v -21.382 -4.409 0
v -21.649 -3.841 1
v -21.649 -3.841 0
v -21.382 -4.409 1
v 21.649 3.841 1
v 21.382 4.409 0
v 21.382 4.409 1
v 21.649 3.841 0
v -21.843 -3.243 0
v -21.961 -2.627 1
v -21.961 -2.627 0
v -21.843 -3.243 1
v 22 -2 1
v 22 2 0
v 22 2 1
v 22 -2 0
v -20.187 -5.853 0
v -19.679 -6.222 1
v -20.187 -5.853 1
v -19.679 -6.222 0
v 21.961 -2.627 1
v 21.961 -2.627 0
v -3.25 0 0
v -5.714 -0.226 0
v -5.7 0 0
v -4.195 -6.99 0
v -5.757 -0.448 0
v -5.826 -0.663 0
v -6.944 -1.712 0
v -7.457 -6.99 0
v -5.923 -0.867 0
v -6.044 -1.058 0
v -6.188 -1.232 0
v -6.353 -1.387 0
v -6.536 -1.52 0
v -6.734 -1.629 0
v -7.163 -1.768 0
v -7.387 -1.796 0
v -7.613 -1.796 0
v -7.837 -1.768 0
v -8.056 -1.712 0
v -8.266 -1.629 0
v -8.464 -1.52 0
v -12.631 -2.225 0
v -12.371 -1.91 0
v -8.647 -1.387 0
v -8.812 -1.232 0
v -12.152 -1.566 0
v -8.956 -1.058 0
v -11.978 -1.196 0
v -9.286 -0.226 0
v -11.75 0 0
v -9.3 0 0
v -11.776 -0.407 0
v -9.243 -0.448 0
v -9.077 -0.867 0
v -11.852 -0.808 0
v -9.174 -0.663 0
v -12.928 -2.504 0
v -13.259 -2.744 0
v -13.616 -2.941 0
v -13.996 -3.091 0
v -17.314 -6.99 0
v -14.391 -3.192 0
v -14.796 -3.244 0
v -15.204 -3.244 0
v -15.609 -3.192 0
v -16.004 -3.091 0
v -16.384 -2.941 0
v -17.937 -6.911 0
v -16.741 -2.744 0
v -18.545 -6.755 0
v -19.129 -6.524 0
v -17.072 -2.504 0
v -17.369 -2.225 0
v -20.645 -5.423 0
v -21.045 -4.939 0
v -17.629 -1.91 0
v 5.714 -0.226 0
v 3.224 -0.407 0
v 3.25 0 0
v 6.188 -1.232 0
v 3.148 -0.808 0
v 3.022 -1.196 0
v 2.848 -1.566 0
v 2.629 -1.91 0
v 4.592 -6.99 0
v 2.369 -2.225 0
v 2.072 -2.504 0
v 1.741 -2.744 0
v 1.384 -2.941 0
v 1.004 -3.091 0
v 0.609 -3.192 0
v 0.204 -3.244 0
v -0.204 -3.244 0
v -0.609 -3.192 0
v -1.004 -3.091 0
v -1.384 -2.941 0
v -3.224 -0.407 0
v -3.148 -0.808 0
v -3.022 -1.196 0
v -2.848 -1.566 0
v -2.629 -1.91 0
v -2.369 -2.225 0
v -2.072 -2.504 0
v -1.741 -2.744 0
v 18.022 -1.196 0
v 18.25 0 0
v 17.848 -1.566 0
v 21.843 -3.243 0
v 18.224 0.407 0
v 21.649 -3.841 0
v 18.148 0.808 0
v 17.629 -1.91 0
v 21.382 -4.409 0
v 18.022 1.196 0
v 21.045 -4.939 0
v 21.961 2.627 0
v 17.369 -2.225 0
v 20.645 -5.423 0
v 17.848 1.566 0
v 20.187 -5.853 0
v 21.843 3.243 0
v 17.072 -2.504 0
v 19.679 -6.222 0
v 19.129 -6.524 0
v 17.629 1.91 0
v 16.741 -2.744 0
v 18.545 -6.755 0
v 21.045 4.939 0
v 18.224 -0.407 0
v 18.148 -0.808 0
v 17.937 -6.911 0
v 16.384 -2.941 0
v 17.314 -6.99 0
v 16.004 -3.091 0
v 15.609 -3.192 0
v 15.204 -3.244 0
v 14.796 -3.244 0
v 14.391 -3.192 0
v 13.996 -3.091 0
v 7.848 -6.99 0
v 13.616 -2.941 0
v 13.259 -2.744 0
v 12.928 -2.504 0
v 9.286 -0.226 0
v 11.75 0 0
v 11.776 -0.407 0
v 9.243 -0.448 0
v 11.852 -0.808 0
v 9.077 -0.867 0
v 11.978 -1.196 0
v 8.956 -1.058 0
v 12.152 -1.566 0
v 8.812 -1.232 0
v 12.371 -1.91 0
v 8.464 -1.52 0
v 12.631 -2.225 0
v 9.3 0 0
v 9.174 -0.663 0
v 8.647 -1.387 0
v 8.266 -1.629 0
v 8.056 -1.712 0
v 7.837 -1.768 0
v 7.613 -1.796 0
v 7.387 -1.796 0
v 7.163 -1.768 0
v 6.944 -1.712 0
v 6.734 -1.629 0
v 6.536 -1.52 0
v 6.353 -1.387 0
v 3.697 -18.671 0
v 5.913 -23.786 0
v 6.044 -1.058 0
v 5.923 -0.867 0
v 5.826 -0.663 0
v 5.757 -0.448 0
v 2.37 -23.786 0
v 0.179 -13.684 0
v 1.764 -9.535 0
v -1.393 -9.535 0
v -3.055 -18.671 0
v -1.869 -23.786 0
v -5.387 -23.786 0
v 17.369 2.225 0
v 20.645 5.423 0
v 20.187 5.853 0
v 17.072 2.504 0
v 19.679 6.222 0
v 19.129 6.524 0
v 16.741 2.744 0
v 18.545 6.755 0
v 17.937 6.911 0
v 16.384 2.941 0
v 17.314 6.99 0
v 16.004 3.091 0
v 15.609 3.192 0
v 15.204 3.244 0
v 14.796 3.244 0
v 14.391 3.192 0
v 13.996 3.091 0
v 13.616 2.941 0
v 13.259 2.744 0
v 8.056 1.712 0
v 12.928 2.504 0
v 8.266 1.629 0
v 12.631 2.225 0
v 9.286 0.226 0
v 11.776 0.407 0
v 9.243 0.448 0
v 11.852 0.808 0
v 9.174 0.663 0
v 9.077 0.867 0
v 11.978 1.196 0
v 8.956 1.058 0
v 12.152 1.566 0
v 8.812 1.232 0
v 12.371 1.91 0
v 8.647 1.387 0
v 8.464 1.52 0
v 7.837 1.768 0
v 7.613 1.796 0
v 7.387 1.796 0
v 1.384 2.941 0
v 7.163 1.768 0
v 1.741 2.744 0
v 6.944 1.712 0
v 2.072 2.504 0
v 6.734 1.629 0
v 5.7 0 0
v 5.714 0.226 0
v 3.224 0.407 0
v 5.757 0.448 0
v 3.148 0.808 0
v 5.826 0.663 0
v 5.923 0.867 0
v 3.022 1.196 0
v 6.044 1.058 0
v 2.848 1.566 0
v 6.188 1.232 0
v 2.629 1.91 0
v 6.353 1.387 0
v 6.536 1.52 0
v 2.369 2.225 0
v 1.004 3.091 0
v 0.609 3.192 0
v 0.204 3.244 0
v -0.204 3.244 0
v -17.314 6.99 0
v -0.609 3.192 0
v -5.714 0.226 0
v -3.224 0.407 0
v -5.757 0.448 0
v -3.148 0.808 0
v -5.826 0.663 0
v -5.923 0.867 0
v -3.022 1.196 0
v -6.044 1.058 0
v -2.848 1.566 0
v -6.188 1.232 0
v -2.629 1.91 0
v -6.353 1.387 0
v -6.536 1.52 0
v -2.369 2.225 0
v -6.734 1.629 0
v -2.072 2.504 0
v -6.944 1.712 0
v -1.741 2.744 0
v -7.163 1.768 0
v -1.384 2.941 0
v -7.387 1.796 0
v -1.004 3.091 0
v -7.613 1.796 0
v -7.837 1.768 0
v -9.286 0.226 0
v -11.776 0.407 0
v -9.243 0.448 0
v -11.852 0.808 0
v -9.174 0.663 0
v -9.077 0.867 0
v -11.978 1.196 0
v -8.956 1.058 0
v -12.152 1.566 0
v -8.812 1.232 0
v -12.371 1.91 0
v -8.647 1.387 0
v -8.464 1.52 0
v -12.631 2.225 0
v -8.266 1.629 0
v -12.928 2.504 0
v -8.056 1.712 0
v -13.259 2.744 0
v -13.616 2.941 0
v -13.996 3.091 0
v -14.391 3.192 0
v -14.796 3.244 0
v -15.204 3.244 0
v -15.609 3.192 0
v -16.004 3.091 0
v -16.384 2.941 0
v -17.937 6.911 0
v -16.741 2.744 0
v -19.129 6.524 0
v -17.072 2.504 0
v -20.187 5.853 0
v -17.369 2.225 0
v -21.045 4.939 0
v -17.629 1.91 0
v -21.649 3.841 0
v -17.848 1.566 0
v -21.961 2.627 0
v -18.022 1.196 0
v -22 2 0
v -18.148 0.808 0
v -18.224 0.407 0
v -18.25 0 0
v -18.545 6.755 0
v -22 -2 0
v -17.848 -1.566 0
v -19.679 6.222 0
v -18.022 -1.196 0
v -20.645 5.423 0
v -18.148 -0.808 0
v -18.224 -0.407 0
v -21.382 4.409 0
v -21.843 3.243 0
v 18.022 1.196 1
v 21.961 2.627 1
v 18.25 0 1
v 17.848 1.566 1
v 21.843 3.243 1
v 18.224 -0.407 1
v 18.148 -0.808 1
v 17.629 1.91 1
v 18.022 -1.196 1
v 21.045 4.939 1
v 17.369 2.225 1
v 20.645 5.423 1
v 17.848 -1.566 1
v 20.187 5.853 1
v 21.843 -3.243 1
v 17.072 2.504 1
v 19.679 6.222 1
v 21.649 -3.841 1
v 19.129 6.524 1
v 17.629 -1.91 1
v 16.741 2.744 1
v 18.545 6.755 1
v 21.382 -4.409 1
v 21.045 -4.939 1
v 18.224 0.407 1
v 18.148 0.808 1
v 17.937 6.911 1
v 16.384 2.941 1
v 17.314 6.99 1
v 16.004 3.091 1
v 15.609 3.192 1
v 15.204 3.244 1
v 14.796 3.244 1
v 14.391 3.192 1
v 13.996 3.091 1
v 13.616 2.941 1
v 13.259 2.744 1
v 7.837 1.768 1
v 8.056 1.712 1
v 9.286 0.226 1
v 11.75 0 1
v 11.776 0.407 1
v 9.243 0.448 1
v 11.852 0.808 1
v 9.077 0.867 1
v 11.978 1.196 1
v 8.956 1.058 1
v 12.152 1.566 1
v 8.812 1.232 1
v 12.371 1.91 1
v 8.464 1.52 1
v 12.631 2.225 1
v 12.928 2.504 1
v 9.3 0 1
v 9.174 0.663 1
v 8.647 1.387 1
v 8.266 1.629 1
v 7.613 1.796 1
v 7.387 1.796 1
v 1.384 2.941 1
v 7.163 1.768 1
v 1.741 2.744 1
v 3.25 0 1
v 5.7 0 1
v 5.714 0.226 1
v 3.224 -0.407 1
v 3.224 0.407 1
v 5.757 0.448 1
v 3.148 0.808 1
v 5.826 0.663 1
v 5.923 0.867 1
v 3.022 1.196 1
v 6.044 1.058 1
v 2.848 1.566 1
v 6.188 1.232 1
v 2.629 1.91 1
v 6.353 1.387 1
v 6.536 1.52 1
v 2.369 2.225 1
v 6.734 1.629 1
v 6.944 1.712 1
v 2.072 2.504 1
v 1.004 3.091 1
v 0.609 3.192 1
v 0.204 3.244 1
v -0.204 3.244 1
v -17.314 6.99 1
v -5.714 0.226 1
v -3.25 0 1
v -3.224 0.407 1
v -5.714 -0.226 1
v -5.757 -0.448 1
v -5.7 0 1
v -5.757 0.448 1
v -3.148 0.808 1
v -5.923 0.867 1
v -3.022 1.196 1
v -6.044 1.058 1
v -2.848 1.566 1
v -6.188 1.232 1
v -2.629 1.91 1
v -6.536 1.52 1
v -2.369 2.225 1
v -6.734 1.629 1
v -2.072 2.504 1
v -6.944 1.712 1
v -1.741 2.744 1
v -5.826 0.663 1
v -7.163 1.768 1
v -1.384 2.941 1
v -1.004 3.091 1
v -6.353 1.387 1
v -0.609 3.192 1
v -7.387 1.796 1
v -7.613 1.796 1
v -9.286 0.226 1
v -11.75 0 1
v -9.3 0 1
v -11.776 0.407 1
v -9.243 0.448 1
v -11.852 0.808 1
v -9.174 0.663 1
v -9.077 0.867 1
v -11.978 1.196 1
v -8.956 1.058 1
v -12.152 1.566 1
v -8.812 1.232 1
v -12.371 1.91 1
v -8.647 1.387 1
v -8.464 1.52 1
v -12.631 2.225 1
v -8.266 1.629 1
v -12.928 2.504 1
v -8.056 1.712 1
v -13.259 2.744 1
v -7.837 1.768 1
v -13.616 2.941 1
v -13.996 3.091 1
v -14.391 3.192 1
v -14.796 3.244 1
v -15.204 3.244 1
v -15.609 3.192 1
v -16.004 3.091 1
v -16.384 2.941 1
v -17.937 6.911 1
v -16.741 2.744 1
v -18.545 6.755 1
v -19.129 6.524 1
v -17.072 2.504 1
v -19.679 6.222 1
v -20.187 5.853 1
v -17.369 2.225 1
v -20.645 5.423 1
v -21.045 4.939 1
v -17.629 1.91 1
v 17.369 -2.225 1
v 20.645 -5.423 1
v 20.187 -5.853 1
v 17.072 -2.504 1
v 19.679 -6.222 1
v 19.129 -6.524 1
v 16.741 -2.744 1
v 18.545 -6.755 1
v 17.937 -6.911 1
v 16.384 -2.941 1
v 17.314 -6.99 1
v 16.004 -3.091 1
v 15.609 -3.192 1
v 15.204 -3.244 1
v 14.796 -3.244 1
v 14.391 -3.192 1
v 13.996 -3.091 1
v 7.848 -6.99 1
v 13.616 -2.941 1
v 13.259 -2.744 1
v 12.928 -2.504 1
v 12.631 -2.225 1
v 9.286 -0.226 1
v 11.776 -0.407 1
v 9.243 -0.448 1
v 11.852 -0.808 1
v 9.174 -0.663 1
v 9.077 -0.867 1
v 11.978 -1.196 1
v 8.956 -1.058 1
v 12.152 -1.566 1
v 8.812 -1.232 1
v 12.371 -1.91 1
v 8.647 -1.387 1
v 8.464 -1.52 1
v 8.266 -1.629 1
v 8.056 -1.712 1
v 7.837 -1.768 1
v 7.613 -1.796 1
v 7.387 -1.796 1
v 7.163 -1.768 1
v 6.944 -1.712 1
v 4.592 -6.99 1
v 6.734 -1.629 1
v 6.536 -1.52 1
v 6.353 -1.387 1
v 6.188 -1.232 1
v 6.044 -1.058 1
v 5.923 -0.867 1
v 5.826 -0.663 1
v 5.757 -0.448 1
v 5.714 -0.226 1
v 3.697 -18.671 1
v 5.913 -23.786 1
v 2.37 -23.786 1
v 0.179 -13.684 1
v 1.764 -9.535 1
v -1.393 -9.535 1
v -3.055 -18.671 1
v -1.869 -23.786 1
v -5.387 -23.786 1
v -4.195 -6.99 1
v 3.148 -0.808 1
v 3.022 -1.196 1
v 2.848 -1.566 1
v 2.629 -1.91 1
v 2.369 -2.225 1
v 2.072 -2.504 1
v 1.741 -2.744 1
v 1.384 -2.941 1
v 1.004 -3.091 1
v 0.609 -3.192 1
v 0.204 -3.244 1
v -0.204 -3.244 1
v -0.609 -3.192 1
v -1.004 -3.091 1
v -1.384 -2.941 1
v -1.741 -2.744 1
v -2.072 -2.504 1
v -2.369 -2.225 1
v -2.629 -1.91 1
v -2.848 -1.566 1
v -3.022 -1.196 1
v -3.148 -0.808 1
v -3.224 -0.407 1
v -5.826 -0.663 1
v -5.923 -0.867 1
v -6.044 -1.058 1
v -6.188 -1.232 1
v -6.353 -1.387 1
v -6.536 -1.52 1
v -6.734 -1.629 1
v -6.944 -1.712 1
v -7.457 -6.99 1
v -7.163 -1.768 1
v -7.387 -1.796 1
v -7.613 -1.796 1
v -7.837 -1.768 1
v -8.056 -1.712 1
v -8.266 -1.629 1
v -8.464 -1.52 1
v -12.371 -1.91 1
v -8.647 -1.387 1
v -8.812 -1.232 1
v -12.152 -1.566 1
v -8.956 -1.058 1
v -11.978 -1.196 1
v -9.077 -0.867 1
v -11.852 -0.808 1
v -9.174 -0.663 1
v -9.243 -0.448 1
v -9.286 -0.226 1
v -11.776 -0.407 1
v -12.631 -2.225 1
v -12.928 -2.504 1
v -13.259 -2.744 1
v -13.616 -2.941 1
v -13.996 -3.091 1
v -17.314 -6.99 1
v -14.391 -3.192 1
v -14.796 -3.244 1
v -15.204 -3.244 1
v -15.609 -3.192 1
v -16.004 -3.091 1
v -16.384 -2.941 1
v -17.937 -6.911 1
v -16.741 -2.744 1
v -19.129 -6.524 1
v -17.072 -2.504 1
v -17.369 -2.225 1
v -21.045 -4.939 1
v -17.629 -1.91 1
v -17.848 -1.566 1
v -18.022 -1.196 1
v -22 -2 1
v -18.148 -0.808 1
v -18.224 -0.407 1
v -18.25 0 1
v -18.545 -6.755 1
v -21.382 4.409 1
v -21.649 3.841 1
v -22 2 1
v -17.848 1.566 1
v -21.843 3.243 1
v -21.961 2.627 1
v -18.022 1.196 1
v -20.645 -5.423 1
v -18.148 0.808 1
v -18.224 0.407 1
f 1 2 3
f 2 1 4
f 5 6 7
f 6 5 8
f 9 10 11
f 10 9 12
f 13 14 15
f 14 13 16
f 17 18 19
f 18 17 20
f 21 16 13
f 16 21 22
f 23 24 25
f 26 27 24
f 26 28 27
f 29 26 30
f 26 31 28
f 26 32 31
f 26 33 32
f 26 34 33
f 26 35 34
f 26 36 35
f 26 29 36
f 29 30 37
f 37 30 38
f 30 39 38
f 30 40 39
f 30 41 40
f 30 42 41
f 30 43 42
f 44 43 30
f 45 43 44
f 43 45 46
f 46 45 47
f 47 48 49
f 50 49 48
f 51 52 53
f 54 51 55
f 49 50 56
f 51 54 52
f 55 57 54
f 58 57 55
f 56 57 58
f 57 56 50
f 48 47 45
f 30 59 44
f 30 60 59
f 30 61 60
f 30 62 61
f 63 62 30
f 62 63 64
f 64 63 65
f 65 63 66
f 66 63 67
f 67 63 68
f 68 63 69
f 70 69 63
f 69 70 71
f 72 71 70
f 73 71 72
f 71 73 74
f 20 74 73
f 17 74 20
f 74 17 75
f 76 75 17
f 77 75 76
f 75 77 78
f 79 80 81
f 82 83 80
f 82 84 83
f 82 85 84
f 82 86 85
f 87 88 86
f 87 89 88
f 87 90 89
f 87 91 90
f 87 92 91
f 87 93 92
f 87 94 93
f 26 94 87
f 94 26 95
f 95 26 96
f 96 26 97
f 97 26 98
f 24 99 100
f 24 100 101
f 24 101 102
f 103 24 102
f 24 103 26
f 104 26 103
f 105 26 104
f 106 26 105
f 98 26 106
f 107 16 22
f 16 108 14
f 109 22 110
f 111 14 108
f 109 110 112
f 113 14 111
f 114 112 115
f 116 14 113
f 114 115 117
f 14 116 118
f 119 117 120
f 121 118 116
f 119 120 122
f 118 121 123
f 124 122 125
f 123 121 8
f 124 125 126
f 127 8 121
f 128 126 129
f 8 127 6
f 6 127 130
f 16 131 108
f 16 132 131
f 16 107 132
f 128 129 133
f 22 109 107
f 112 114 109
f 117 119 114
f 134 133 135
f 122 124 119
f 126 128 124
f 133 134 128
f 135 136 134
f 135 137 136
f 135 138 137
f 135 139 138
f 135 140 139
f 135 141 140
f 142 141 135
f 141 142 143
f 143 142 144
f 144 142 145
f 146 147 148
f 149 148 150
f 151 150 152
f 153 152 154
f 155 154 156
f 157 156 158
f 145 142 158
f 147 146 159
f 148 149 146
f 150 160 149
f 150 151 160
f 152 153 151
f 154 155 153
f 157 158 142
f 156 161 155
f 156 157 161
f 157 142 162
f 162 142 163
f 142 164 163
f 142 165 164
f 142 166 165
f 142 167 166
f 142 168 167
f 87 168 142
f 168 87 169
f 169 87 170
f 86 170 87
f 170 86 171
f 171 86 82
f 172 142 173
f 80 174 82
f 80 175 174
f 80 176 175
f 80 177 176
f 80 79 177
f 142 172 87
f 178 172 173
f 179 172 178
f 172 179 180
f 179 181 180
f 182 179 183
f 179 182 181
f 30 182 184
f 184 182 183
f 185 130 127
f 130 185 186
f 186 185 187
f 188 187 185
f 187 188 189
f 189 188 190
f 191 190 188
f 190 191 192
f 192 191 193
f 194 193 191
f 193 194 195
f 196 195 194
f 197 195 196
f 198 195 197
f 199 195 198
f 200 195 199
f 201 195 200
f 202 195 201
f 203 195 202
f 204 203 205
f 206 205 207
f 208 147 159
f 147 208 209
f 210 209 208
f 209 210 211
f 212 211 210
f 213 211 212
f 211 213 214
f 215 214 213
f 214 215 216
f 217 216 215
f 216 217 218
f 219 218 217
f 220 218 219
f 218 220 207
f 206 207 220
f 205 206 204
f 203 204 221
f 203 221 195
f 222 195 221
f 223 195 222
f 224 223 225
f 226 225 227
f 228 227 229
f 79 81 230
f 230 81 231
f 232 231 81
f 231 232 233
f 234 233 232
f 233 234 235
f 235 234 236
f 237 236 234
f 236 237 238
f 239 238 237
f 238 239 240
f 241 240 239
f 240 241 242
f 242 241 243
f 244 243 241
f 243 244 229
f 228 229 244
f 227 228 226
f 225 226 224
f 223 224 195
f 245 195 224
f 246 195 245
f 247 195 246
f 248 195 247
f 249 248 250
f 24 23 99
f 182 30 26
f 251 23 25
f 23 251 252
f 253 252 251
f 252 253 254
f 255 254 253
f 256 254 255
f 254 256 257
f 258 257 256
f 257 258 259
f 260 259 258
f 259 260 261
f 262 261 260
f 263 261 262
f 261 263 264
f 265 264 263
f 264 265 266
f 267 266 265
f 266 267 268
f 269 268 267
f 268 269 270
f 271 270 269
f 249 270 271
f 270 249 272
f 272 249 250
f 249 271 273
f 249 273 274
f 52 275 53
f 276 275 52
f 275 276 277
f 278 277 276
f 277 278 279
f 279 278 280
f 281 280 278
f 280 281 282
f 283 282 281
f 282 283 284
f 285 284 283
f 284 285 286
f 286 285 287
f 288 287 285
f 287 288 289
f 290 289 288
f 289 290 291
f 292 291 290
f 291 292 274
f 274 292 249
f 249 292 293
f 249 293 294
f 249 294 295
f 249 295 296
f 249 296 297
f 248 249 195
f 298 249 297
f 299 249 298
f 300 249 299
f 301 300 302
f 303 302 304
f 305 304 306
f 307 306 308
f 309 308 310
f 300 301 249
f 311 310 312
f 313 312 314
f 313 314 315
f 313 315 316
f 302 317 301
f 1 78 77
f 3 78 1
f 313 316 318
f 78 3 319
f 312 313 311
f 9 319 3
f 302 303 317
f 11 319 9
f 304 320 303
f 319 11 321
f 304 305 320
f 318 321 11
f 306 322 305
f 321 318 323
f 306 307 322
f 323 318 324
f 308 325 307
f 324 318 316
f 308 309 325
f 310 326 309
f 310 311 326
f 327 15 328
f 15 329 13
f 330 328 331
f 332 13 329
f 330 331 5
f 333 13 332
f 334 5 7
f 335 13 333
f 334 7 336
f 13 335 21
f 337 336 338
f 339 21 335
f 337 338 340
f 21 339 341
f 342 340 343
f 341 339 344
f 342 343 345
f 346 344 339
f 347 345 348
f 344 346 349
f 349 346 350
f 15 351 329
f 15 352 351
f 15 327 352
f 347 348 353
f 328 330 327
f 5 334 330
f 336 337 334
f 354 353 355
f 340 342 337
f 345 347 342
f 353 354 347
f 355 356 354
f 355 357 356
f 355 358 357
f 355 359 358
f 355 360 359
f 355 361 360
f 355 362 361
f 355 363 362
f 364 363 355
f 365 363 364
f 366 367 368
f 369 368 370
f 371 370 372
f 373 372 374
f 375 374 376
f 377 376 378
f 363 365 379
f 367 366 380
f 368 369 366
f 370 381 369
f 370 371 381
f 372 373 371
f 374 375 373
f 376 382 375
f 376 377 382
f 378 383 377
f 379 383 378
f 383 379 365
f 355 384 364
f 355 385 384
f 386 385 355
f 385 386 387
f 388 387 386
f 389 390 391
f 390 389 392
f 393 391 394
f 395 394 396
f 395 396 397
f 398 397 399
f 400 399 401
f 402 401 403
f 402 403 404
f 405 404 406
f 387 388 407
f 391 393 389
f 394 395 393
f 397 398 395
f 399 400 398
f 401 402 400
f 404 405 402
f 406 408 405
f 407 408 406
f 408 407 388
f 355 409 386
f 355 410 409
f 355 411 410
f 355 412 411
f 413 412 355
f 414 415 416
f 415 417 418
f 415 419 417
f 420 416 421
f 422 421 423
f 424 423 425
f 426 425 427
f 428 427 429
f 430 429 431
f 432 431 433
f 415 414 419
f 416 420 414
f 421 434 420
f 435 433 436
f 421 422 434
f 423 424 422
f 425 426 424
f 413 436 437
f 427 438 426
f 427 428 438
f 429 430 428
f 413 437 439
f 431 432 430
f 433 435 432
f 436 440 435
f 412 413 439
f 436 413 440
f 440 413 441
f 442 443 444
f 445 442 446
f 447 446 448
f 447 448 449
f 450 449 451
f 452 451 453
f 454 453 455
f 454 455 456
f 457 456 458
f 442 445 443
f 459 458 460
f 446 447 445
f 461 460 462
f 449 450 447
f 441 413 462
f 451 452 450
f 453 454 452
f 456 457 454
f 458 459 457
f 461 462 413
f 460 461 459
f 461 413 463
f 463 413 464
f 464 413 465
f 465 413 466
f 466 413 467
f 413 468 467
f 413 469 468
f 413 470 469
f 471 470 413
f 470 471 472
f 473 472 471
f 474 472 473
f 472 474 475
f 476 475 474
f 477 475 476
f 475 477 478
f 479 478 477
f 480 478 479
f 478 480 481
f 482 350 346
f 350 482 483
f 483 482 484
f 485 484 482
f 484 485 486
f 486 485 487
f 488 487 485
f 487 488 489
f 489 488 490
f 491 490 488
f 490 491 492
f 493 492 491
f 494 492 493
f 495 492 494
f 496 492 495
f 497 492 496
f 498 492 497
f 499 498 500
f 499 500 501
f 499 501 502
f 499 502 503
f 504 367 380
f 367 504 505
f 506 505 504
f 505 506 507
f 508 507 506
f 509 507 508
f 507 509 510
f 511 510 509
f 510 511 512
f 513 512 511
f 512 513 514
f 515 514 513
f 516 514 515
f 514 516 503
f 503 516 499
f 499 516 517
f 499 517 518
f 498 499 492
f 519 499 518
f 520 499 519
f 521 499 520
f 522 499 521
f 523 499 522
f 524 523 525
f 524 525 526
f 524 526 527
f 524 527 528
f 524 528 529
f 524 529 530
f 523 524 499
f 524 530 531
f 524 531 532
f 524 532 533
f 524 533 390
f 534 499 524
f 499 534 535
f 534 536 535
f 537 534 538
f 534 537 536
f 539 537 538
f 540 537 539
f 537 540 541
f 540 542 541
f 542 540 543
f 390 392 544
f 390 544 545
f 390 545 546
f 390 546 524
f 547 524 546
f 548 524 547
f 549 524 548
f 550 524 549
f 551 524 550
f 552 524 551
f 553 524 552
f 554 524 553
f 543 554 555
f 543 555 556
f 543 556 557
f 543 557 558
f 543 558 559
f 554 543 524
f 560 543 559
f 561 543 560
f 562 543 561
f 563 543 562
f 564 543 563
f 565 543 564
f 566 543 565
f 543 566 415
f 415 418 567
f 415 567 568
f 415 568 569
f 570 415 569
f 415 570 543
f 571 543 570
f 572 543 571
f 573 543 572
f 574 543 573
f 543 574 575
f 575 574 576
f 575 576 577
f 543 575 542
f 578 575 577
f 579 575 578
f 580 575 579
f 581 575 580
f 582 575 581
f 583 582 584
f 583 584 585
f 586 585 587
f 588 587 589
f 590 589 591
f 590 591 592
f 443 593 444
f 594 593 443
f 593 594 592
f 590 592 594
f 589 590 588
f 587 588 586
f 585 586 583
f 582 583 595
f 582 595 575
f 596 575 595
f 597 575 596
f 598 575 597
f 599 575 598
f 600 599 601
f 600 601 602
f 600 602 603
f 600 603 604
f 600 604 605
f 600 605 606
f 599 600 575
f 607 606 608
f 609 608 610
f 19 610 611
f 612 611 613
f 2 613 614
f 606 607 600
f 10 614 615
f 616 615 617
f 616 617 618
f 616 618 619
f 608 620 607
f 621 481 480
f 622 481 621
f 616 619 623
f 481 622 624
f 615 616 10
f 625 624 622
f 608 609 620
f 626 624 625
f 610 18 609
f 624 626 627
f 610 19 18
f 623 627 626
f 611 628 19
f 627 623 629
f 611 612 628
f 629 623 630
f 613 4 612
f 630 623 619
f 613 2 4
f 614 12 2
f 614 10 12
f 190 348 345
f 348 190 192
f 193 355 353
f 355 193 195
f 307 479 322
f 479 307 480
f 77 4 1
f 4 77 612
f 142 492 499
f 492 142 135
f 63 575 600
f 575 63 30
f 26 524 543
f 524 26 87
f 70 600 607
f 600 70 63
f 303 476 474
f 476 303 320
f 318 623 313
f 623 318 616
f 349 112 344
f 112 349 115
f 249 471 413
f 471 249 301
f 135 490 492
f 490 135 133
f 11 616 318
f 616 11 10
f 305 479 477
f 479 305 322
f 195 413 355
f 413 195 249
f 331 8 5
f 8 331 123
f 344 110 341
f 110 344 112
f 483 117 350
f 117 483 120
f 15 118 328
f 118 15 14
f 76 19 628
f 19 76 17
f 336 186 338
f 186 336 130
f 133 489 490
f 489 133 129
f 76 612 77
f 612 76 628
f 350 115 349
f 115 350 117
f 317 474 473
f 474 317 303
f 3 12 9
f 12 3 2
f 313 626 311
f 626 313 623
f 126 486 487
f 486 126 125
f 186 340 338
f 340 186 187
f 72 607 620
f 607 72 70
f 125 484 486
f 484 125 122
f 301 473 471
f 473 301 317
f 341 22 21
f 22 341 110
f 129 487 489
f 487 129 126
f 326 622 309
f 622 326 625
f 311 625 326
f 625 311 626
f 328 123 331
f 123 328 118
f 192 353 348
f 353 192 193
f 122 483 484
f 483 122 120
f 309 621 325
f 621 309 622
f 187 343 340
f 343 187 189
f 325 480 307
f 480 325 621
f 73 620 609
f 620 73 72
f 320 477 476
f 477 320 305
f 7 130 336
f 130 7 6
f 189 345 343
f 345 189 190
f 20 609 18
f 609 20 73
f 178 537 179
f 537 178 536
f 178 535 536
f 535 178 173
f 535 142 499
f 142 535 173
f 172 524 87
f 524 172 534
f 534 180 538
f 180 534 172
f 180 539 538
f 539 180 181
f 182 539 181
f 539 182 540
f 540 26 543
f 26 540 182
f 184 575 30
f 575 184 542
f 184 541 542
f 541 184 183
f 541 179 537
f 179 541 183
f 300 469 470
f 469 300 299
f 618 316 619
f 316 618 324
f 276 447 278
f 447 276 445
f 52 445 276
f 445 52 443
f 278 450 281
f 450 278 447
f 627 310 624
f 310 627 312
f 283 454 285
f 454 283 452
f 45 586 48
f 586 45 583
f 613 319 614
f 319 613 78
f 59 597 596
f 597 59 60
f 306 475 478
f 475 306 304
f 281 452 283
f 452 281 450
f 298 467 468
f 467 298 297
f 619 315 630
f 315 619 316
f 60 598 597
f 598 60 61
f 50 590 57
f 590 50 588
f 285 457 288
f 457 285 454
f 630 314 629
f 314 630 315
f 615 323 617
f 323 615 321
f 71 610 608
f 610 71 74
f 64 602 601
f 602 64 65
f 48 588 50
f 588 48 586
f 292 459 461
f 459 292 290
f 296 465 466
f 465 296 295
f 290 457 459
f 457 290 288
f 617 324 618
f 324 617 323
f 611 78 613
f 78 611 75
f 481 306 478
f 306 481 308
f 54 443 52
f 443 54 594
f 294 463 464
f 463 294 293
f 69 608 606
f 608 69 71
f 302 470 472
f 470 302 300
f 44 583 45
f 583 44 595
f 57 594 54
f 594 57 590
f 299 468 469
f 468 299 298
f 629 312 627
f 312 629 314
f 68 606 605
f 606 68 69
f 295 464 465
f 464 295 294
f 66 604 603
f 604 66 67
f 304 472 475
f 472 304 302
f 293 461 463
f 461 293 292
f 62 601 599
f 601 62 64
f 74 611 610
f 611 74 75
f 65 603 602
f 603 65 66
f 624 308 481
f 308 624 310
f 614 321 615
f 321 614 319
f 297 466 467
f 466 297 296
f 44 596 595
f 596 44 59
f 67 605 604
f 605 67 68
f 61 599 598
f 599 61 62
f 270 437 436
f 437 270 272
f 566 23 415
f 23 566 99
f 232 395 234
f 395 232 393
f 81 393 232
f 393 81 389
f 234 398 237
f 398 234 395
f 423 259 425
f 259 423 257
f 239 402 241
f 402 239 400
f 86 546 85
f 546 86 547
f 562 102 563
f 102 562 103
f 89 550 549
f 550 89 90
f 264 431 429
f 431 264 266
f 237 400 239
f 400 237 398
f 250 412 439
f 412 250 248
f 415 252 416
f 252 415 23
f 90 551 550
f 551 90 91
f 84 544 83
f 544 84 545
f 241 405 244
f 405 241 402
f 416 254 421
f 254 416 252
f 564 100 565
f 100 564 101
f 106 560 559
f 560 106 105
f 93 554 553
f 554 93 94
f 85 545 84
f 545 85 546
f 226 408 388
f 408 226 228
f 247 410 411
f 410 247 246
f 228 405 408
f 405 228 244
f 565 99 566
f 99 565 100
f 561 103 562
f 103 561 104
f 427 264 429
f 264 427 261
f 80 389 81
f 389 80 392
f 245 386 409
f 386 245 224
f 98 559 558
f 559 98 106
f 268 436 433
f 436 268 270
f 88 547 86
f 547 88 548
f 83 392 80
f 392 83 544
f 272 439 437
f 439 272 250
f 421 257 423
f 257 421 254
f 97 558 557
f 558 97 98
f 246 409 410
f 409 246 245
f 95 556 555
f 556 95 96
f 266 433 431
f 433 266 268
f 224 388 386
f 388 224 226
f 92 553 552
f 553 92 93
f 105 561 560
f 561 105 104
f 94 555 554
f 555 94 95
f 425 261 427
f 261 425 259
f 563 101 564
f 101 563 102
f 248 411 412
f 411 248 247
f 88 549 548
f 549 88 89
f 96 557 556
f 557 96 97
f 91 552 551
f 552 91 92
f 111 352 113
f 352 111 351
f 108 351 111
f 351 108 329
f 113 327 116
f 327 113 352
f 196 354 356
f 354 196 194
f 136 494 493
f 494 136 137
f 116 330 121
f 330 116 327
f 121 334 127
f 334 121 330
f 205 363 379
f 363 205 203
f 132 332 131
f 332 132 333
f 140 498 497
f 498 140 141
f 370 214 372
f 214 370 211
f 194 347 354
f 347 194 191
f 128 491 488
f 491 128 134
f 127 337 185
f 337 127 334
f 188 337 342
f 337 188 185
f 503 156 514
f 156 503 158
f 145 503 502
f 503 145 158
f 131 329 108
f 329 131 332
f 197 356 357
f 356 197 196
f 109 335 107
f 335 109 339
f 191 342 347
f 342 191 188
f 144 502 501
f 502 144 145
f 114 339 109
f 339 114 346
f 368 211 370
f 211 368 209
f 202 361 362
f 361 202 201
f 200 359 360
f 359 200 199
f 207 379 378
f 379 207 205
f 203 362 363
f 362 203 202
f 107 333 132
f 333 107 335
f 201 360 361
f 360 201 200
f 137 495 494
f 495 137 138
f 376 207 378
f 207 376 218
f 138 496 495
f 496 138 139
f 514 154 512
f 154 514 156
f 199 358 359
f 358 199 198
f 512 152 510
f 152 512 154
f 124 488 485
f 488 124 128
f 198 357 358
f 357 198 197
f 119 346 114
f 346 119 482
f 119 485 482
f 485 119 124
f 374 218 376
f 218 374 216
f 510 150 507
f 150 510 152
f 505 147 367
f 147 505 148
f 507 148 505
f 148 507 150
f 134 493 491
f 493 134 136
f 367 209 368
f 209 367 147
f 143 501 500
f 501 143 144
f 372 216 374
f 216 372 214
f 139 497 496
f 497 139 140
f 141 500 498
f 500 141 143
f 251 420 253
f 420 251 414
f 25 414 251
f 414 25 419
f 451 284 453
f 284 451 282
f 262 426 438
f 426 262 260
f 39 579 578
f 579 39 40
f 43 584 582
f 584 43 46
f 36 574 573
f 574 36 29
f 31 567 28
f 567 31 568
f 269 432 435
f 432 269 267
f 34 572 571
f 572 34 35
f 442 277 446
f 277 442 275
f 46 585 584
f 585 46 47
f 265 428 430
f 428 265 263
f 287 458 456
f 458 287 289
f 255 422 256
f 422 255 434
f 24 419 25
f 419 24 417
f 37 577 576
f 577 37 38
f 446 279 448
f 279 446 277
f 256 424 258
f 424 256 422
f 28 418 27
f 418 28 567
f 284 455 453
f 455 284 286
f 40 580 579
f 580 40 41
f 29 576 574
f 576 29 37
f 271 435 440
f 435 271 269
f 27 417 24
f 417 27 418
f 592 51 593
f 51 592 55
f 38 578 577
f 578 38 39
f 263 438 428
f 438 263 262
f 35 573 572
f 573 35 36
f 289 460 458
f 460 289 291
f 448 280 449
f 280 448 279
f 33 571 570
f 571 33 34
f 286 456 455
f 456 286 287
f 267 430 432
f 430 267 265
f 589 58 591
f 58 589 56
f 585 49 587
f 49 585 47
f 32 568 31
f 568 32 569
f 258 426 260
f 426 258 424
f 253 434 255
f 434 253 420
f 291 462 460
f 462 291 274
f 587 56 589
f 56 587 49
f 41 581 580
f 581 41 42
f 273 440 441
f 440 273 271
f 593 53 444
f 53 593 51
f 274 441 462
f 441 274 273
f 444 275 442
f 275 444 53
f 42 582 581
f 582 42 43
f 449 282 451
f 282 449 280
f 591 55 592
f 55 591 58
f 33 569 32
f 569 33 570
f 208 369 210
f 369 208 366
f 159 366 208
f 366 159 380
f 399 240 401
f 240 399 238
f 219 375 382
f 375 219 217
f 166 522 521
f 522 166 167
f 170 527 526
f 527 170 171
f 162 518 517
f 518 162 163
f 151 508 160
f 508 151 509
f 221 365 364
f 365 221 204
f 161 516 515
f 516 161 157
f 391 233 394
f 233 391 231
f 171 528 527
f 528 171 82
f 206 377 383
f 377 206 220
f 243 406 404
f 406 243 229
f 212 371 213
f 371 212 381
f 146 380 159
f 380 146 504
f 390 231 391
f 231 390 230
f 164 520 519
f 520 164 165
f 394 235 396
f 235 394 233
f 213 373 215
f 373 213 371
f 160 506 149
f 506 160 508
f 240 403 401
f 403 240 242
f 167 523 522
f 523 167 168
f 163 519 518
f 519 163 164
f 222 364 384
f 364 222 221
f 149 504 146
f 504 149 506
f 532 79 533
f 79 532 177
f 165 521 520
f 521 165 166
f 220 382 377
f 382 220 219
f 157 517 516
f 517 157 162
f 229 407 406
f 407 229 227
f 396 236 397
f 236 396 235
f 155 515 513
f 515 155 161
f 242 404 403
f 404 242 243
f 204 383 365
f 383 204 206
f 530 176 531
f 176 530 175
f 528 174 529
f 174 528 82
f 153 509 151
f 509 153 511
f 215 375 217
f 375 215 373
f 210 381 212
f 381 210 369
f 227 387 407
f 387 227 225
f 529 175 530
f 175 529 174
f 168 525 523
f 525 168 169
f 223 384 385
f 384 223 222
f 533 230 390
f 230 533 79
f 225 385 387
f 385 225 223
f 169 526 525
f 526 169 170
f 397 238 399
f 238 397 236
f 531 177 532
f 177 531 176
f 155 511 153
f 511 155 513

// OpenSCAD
$fn = 50;


difference() {
	union() {
		hull() {
			translate(v = [-17.0000000000, 2.0000000000, 0]) {
				cylinder(h = 1, r = 5);
			}
			translate(v = [17.0000000000, 2.0000000000, 0]) {
				cylinder(h = 1, r = 5);
			}
			translate(v = [-17.0000000000, -2.0000000000, 0]) {
				cylinder(h = 1, r = 5);
			}
			translate(v = [17.0000000000, -2.0000000000, 0]) {
				cylinder(h = 1, r = 5);
			}
		}
		translate(v = [0, -5, 0]) {
			linear_extrude(height = 1) {
				text(font = "DejaVu Sans Mono:style=Bold", halign = "center", size = 19.0000000000, text = "W", valign = "top");
			}
		}
	}
	union() {
		translate(v = [-15.0000000000, 0.0000000000, 0]) {
			translate(v = [0, 0, -100]) {
				cylinder(h = 200, r = 3.2500000000);
			}
		}
		translate(v = [0, 0, -100]) {
			cylinder(h = 200, r = 3.2500000000);
		}
		translate(v = [15.0000000000, 0.0000000000, 0]) {
			translate(v = [0, 0, -100]) {
				cylinder(h = 200, r = 3.2500000000);
			}
		}
		translate(v = [-15.0000000000, 0.0000000000, 0]) {
			translate(v = [0, 0, -100]) {
				cylinder(h = 200, r = 1.8000000000);
			}
		}
		translate(v = [-7.5000000000, 0.0000000000, 0]) {
			translate(v = [0, 0, -100]) {
				cylinder(h = 200, r = 1.8000000000);
			}
		}
		translate(v = [0, 0, -100]) {
			cylinder(h = 200, r = 1.8000000000);
		}
		translate(v = [7.5000000000, 0.0000000000, 0]) {
			translate(v = [0, 0, -100]) {
				cylinder(h = 200, r = 1.8000000000);
			}
		}
		translate(v = [15.0000000000, 0.0000000000, 0]) {
			translate(v = [0, 0, -100]) {
				cylinder(h = 200, r = 1.8000000000);
			}
		}
	}
}
